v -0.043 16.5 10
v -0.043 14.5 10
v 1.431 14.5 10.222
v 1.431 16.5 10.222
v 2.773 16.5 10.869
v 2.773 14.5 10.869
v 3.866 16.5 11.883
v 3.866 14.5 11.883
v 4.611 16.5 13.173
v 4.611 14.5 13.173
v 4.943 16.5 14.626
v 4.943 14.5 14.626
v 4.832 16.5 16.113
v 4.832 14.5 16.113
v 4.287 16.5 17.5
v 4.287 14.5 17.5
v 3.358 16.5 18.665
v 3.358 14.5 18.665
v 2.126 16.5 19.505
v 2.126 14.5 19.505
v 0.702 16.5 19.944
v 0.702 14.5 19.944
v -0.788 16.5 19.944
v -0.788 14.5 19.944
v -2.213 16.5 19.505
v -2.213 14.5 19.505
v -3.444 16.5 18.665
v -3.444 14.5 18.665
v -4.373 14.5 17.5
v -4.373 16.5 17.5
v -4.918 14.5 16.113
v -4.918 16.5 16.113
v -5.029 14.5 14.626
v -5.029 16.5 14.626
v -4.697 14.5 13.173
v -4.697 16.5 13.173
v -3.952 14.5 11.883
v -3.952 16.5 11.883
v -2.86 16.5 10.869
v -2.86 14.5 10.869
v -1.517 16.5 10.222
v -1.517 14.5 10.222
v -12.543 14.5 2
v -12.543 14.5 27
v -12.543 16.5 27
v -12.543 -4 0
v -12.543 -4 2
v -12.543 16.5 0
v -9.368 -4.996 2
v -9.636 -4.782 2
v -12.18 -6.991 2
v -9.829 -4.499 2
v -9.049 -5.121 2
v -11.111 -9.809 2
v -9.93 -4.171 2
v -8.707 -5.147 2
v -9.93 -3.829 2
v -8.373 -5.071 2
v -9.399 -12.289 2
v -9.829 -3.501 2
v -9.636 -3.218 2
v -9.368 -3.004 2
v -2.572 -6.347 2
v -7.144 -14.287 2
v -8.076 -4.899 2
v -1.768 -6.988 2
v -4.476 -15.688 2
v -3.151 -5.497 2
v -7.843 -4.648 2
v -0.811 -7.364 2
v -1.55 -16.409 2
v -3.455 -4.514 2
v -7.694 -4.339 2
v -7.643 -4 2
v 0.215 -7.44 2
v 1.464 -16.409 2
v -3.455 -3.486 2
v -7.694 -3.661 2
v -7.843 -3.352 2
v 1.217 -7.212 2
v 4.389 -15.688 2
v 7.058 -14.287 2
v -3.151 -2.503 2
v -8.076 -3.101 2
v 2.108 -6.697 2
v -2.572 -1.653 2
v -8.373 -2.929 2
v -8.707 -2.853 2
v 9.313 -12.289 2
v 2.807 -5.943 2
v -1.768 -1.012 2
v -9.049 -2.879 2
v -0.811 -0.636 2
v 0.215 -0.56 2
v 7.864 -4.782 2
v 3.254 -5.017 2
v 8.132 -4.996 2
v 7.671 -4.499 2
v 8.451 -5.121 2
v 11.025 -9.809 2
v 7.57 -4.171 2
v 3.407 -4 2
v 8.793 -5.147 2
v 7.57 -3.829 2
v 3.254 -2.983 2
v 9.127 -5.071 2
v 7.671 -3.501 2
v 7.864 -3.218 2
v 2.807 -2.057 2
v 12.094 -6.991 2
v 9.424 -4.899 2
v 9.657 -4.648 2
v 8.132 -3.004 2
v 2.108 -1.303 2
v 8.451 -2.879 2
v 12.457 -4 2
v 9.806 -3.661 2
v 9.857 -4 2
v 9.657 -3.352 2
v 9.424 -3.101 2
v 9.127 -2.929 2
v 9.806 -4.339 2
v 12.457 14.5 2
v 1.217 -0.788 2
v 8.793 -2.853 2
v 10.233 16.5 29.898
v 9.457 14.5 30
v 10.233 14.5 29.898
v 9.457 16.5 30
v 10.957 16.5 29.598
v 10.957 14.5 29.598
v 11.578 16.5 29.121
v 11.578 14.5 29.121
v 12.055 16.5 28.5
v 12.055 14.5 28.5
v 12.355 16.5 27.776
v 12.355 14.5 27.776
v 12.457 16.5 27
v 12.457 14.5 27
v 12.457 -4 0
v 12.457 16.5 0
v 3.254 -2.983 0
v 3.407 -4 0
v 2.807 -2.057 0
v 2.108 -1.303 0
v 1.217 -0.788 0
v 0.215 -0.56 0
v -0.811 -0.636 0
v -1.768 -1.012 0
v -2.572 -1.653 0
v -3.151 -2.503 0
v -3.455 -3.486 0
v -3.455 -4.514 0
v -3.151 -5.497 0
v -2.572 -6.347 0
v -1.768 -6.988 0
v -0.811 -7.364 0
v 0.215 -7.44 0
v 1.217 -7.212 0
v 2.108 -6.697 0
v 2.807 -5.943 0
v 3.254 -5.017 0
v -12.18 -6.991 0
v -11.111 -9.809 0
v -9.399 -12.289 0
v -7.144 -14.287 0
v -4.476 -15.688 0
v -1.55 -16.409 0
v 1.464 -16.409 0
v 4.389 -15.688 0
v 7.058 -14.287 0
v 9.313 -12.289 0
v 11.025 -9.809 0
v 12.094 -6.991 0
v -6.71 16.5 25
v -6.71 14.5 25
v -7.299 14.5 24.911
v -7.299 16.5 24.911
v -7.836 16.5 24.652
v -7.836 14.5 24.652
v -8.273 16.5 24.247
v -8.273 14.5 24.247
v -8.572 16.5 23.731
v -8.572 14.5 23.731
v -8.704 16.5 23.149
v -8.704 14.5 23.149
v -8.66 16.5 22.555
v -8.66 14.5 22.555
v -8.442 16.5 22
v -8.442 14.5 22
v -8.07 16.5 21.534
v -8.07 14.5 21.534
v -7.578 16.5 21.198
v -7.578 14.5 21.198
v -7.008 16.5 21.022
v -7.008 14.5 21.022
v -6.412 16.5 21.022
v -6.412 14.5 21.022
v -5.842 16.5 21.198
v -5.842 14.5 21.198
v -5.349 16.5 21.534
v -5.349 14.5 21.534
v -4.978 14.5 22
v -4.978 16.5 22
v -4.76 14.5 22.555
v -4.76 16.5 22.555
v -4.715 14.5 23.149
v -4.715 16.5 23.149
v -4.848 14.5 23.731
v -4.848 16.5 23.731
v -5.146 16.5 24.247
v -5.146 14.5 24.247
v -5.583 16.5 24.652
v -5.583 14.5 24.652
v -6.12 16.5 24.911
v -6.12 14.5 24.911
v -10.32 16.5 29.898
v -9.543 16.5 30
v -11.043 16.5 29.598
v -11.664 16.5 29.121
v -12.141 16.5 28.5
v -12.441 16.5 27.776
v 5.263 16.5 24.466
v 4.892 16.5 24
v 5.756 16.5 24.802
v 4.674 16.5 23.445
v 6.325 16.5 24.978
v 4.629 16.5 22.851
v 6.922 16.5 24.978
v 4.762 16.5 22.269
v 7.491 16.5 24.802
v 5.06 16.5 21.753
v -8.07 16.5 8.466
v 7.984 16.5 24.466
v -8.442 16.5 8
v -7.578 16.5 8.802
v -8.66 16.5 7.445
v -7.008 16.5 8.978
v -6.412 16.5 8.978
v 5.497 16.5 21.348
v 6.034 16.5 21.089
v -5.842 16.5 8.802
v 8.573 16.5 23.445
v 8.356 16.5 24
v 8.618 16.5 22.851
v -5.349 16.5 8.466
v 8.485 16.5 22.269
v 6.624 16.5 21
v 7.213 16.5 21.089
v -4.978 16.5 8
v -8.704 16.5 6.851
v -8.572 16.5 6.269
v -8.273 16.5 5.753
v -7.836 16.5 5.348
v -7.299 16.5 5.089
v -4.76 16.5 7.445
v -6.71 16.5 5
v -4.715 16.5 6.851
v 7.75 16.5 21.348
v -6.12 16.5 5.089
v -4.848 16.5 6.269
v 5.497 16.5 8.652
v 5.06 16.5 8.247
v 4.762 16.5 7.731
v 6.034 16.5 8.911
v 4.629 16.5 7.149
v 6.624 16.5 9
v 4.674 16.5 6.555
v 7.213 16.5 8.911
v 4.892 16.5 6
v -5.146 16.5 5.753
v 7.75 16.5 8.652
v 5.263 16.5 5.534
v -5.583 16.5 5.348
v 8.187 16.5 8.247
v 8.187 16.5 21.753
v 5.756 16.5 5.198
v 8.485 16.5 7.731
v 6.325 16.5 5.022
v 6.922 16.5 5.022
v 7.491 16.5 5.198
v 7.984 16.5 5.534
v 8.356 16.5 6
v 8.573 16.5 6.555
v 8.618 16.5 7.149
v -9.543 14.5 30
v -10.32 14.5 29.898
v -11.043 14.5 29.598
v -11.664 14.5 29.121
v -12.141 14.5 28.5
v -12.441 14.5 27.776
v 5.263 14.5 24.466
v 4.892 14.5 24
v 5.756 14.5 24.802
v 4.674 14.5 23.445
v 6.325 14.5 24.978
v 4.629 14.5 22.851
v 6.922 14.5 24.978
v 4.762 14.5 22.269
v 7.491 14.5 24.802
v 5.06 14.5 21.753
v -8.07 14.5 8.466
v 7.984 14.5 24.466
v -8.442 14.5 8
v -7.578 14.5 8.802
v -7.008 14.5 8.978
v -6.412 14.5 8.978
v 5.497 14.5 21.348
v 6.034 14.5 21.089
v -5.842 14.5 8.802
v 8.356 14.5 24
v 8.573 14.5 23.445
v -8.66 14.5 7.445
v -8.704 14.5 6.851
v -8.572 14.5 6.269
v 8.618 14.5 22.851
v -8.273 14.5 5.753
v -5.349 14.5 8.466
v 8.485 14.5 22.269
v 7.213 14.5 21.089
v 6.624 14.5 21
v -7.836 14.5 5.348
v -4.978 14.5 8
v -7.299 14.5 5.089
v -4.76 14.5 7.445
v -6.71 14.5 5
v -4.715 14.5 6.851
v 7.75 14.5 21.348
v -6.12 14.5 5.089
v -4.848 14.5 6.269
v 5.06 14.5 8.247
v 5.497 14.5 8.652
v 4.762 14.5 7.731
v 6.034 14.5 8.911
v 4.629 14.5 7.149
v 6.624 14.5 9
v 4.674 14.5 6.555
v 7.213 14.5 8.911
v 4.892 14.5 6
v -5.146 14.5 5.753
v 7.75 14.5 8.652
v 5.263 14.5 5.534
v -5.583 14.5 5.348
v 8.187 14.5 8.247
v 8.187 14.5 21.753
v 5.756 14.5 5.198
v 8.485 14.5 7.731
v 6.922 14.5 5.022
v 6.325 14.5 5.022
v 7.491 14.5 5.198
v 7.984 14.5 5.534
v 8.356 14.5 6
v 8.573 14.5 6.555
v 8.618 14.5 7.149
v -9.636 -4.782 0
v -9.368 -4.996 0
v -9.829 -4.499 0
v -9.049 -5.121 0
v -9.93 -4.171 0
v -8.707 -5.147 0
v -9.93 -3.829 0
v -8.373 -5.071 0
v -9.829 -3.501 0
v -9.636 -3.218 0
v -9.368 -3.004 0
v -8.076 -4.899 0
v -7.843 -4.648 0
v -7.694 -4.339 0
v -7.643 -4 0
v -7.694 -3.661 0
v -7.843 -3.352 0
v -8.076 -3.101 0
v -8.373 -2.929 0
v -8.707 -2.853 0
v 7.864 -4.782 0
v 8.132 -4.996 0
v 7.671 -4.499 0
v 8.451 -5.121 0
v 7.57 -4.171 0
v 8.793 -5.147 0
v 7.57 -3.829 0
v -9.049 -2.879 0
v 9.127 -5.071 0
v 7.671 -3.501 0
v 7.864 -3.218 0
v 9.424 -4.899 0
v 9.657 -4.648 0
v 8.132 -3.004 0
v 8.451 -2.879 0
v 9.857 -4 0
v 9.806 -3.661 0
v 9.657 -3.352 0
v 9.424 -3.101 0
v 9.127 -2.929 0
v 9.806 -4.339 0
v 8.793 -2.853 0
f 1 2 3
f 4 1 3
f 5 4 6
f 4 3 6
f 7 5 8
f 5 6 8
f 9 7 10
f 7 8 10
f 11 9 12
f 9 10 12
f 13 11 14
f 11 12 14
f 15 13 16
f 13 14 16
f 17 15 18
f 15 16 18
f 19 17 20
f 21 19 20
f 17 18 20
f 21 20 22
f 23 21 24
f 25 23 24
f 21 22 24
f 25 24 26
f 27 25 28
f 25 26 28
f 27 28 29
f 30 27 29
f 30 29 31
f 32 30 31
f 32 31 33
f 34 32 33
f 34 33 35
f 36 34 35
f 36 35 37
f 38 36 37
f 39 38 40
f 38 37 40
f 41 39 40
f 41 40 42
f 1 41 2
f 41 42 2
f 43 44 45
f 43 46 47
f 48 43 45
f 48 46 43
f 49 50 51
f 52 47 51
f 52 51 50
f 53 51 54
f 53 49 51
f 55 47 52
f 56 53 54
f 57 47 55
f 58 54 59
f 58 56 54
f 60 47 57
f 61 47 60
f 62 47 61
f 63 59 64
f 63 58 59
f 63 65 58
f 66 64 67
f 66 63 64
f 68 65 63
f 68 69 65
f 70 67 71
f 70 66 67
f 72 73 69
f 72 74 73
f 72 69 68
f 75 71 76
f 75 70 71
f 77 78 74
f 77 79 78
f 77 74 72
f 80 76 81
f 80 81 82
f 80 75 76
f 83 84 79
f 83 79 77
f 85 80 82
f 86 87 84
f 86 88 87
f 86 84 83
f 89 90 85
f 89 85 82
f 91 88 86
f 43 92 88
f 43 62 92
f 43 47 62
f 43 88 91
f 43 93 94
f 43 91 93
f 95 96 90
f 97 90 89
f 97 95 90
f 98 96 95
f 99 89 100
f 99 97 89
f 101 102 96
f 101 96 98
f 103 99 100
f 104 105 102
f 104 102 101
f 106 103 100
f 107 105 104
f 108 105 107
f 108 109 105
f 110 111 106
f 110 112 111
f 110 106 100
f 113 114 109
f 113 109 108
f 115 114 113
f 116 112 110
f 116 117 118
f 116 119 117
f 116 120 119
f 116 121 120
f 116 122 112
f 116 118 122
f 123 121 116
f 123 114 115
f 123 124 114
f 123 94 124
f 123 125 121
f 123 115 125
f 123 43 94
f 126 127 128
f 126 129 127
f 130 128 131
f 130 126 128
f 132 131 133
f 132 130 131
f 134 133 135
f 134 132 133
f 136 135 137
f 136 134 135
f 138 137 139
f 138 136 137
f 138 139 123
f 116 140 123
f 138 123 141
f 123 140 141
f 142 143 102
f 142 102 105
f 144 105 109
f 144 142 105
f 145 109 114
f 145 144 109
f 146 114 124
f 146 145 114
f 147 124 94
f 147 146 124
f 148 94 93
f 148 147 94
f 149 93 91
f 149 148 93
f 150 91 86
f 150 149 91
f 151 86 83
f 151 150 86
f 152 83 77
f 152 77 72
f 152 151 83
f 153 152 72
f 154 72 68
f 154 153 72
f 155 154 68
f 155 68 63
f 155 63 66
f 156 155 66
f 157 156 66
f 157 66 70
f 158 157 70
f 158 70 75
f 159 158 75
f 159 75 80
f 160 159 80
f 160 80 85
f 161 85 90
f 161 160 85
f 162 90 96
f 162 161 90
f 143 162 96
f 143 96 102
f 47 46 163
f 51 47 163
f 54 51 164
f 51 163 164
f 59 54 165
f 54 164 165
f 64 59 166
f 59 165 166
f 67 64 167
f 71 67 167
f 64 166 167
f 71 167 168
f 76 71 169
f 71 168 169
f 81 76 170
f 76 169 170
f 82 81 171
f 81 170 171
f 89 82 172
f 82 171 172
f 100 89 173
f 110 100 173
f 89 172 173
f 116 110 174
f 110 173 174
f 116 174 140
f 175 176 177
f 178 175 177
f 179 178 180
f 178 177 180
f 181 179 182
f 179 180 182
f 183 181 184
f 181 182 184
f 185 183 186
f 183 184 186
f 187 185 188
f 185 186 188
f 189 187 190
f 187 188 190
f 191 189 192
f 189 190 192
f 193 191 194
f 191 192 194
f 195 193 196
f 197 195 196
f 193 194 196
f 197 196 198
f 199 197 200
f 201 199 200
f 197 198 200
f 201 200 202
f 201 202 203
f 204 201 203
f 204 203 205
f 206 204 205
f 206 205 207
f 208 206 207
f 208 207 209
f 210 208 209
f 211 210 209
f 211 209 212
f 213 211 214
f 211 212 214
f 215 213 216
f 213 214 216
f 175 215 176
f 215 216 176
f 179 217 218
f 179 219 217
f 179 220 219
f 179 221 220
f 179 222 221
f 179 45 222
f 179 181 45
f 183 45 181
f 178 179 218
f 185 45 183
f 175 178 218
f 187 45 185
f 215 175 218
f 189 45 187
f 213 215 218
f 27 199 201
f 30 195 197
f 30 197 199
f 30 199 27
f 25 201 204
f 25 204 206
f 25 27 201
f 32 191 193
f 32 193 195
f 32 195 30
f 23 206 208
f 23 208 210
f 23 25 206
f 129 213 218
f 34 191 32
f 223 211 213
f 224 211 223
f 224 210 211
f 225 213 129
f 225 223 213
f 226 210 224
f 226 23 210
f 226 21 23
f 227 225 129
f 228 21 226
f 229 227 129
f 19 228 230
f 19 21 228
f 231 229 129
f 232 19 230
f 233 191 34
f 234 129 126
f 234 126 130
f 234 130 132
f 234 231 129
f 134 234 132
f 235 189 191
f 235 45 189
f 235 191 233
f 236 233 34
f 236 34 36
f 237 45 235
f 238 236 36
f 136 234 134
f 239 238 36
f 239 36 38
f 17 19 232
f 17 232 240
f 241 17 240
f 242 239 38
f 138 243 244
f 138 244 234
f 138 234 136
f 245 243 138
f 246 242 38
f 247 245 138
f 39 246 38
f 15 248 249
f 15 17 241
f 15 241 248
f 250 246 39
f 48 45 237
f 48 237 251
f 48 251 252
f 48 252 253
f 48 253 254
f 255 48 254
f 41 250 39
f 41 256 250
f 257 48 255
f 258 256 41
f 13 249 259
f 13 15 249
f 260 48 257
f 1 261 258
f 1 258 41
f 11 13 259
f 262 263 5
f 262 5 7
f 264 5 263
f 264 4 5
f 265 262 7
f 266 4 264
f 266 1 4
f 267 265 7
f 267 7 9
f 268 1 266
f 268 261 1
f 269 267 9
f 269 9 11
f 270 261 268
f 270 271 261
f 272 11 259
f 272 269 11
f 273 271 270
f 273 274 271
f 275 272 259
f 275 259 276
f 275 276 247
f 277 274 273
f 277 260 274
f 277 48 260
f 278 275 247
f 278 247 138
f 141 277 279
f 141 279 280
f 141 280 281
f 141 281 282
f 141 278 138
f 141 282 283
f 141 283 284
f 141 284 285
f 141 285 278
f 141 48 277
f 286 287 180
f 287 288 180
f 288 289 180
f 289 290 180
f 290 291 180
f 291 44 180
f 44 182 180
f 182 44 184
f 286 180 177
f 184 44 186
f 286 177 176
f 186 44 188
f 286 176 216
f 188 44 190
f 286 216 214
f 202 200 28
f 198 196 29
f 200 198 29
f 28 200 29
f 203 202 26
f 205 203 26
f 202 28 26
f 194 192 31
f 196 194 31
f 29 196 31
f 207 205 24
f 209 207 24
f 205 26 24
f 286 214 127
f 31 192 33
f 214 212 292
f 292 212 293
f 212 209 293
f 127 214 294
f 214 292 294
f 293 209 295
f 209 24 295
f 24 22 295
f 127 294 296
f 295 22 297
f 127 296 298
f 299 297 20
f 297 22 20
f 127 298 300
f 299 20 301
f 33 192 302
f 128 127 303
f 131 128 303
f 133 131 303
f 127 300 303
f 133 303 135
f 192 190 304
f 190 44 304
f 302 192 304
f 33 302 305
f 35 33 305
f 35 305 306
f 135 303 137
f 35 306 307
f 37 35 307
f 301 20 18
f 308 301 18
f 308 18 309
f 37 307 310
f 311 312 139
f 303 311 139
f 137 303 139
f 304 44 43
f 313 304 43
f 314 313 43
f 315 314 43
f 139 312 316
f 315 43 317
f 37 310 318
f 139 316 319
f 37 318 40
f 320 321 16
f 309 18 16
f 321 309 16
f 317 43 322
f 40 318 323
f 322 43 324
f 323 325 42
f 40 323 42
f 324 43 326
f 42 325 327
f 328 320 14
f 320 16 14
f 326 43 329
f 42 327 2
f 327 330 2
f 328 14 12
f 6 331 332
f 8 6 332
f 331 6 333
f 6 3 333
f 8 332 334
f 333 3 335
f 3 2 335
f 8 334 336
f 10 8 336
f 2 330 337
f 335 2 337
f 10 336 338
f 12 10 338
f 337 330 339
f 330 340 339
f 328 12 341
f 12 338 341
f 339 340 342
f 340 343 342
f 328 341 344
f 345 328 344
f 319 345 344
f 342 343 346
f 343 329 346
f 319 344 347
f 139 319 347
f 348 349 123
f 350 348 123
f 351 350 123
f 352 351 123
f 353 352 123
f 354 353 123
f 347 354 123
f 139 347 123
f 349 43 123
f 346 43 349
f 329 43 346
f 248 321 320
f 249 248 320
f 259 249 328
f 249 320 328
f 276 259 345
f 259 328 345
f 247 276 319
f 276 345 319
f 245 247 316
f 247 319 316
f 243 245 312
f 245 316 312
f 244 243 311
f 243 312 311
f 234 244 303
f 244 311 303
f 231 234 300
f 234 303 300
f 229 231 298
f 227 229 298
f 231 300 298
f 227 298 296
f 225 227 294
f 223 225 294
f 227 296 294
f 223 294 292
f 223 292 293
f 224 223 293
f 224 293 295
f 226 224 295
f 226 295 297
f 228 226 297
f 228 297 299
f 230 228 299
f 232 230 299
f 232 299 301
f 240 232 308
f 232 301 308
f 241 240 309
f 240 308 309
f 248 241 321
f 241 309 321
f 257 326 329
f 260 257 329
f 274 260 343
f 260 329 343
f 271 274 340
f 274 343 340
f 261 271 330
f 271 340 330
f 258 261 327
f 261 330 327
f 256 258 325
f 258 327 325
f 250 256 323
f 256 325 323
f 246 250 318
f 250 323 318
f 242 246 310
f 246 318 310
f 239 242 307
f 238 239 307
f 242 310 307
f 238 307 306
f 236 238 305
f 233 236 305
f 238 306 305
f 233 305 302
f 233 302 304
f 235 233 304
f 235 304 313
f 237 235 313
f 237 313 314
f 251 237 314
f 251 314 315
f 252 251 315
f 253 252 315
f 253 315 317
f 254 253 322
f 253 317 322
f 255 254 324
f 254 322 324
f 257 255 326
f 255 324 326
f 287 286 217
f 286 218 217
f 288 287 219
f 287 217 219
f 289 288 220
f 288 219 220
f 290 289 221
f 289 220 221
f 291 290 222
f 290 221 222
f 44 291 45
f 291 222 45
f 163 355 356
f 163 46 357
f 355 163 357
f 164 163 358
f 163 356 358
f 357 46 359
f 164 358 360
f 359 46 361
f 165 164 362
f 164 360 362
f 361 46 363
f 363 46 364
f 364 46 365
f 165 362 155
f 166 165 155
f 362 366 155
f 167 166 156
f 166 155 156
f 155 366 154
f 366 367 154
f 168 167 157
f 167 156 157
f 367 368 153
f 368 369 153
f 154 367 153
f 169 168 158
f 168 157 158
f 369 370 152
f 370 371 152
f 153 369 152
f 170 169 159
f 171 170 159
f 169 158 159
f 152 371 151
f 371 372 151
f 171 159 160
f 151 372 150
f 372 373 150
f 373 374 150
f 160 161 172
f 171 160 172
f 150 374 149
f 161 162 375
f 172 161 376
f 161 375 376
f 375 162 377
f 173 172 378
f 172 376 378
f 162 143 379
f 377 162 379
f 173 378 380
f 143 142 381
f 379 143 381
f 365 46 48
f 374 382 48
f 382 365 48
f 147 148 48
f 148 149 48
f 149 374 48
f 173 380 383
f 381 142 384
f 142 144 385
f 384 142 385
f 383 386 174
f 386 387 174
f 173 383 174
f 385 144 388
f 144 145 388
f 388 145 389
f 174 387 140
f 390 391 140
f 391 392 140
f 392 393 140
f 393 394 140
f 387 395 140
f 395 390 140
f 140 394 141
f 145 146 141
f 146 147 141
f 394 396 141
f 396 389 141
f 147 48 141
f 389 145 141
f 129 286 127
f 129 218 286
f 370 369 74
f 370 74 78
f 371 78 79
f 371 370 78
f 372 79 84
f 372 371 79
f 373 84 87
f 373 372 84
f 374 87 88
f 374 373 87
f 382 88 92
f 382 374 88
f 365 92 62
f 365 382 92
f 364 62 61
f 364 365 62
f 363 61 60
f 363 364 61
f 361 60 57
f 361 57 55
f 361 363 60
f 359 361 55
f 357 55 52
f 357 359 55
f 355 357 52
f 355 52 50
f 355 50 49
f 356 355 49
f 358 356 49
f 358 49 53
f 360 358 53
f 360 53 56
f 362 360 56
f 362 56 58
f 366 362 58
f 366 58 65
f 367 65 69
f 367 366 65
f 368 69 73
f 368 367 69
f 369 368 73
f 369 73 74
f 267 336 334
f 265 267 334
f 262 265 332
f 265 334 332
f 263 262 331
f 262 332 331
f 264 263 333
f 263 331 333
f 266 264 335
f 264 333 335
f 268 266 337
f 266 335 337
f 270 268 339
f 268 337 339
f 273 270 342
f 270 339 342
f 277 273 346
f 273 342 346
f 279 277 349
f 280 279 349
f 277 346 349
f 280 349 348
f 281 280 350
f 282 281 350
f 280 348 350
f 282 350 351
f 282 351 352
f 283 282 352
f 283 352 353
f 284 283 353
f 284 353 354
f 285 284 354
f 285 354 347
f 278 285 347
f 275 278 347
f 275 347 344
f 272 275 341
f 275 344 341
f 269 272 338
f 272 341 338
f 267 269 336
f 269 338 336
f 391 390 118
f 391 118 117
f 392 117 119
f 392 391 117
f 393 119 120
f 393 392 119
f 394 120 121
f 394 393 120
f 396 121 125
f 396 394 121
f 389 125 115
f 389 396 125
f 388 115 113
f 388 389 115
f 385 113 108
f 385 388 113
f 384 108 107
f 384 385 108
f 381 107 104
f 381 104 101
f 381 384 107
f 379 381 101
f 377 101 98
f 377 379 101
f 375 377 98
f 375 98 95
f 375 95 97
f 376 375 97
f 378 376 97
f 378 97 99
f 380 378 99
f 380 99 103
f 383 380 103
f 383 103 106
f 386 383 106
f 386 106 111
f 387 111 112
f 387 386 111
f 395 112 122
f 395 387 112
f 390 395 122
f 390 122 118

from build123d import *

# Parameters (mm, degrees)
ESBO_O1_R                = 3.45
ESBO_O1_R_2              = 1.15
RESSALTO_EXTRUS_O2_DEPTH = 2
ESBO_O2_W                = 25
ESBO_O2_H                = 2
RESSALTO_EXTRUS_O3_DEPTH = 28
ESBO_O3_R                = 5
ESBO_O3_R_2              = 2
CORTE_EXTRUS_O1_DEPTH    = 2
FILETE1_R                = 3
FILETE2_R                = 3


with BuildPart() as part:
    # Esboço1 → Ressalto-extrusão2 (new body)
    with BuildSketch(Plane.XY):
        with BuildLine():
            Line((12.456898993, -4), (12.456898993, 16.5))
            Line((12.456898993, 16.5), (-12.543101007, 16.5))
            Line((-12.543101007, 16.5), (-12.543101007, -4))
            ThreePointArc((-12.543101007, -4), (-0.043101007, -16.5), (12.456898993, -4))
        make_face()
        with Locations((-0.043101007, -4)):
            Circle(ESBO_O1_R, mode=Mode.SUBTRACT)
        with Locations((8.706898993, -4)):
            Circle(ESBO_O1_R_2, mode=Mode.SUBTRACT)
        with Locations((-8.793101007, -4)):
            Circle(ESBO_O1_R_2, mode=Mode.SUBTRACT)
    extrude(amount=RESSALTO_EXTRUS_O2_DEPTH)

    # Esboço2 → Ressalto-extrusão3 (add)
    with BuildSketch(Plane.XY.offset(2)):
        with Locations((-0.043101007, 15.5)):
            Rectangle(ESBO_O2_W, ESBO_O2_H)
    extrude(amount=RESSALTO_EXTRUS_O3_DEPTH)

    # Esboço3 → Corte-extrusão1 (cut)
    with BuildSketch(Plane.XZ.offset(-14.5)):
        with Locations(Location((-0.043101007, 15, 0), (0, 0, 270))):
            Circle(ESBO_O3_R)
        with Locations(Location((-6.709767674, 7, 0), (0, 0, 270))):
            Circle(ESBO_O3_R_2)
        with Locations(Location((6.623565659, 7, 0), (0, 0, 90))):
            Circle(ESBO_O3_R_2)
        with Locations(Location((6.623565659, 23, 0), (0, 0, 270))):
            Circle(ESBO_O3_R_2)
        with Locations(Location((-6.709767674, 23, 0), (0, 0, 90))):
            Circle(ESBO_O3_R_2)
    extrude(amount=-CORTE_EXTRUS_O1_DEPTH, mode=Mode.SUBTRACT)

    # Filete1
    filete1_edges = [part.edges().sort_by_distance(p)[0] for p in [
        (12.456898993, 15.5, 30),
    ]]
    fillet(filete1_edges, radius=FILETE1_R)

    # Filete2
    filete2_edges = [part.edges().sort_by_distance(p)[0] for p in [
        (-12.543101007, 15.5, 30),
    ]]
    fillet(filete2_edges, radius=FILETE2_R)


solid = part.part
